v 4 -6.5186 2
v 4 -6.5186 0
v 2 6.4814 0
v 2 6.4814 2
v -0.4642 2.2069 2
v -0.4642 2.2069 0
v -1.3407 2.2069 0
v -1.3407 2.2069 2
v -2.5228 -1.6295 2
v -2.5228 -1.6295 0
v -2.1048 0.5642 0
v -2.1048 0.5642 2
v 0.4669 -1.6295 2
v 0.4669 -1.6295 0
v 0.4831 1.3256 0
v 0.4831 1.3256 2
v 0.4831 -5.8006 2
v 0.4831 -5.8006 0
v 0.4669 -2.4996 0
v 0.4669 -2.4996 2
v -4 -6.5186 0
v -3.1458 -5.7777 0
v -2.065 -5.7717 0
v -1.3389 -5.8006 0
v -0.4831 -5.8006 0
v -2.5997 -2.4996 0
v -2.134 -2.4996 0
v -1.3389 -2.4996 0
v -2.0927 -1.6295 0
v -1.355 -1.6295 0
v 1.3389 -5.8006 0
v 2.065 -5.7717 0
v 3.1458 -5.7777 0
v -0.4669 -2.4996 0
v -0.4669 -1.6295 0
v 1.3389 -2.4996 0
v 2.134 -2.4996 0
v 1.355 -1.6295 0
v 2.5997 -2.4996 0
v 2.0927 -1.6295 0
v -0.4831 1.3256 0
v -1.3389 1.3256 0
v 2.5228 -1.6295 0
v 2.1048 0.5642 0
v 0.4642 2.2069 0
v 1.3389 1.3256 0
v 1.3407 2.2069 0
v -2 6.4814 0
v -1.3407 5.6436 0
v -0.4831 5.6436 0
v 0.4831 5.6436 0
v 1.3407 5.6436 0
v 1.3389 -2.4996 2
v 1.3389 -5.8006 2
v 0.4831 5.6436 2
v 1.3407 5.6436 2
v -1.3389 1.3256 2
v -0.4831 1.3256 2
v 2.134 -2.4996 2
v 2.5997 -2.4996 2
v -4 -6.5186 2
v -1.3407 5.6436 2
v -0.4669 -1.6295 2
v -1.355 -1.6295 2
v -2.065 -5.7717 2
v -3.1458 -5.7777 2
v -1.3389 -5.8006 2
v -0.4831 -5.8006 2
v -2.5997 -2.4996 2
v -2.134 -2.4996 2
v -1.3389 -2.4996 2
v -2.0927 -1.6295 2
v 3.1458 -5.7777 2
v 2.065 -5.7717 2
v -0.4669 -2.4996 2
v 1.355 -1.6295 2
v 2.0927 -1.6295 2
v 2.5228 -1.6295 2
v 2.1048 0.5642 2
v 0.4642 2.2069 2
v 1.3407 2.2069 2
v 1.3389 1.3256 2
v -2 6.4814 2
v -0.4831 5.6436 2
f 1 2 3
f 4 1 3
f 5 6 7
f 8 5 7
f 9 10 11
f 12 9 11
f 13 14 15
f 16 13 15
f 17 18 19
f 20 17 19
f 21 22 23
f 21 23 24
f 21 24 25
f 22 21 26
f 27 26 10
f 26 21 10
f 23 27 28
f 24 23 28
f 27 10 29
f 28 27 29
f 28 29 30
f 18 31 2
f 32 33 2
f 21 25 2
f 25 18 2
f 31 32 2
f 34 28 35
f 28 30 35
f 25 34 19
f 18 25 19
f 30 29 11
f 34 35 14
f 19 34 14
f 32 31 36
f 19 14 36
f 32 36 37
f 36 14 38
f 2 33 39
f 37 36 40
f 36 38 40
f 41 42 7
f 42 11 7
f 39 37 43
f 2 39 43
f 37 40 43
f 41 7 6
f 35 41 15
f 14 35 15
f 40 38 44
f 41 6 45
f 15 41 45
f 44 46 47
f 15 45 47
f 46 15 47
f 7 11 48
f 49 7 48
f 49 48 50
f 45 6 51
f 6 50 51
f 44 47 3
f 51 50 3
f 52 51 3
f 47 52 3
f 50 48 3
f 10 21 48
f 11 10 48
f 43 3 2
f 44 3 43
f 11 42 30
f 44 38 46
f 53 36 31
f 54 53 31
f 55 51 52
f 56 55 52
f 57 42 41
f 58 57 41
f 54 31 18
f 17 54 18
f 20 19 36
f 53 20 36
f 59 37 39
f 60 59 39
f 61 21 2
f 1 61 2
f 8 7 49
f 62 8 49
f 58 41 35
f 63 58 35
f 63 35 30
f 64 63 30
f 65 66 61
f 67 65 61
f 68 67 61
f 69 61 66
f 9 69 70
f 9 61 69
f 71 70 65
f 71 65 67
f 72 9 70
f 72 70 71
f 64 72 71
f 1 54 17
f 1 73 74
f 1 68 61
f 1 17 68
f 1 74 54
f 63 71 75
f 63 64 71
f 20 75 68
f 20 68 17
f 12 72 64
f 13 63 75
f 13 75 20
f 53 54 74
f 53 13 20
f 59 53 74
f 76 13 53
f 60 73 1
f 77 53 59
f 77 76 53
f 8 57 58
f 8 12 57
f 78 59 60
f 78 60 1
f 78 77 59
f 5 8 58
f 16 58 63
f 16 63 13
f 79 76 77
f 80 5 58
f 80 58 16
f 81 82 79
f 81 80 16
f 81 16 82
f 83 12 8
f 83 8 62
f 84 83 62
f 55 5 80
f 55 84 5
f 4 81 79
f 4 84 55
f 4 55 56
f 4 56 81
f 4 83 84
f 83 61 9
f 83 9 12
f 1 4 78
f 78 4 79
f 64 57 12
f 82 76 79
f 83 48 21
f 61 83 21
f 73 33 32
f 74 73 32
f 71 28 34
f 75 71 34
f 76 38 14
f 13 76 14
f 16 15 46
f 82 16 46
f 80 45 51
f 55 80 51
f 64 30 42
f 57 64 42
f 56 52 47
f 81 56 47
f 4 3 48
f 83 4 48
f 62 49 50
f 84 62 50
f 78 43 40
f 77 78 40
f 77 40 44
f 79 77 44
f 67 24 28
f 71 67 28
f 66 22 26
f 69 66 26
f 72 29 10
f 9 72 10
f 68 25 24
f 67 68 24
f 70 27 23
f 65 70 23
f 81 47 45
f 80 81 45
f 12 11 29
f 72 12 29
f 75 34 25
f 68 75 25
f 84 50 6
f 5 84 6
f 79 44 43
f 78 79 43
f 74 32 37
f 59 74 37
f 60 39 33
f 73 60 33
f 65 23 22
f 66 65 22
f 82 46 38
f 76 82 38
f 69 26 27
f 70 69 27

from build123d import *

# Parameters (mm, degrees)
F1_DEPTH = 2


with BuildPart() as f1:
    # F0 (on Top) → F1 (new body)
    with BuildSketch(Plane.XY):
        Polygon((2, 6.481428), (0, 6.481428), (-2, 6.481428), (-4, -6.518572), (0, -6.518572), (4, -6.518572), align=None)
        Polygon((-2.599652, -2.499616), (-2.133971, -2.499616), (-2.064983, -5.771744), (-3.14582, -5.777694), align=None, mode=Mode.SUBTRACT)
        Polygon((-1.338938, -5.800603), (-1.338938, -2.499616), (-0.466865, -2.499616), (-0.483132, -5.800603), align=None, mode=Mode.SUBTRACT)
        Polygon((-2.522781, -1.629516), (-2.104775, 0.564183), (-2.0927, -1.629516), align=None, mode=Mode.SUBTRACT)
        Polygon((-1.354969, -1.629516), (-1.338938, 1.325562), (-0.483132, 1.325562), (-0.466865, -1.629516), align=None, mode=Mode.SUBTRACT)
        Polygon((1.338938, -5.800603), (0.483132, -5.800603), (0.466865, -2.499616), (1.338938, -2.499616), align=None, mode=Mode.SUBTRACT)
        Polygon((2.599652, -2.499616), (3.14582, -5.777694), (2.064983, -5.771744), (2.133971, -2.499616), align=None, mode=Mode.SUBTRACT)
        Polygon((1.354969, -1.629516), (0.466865, -1.629516), (0.483132, 1.325562), (1.338938, 1.325562), align=None, mode=Mode.SUBTRACT)
        Polygon((2.522781, -1.629516), (2.0927, -1.629516), (2.104775, 0.564183), align=None, mode=Mode.SUBTRACT)
        Polygon((-1.34072, 5.643583), (-0.483132, 5.643583), (-0.464214, 2.206922), (-1.34072, 2.206922), align=None, mode=Mode.SUBTRACT)
        Polygon((1.34072, 5.643583), (1.34072, 2.206922), (0.464214, 2.206922), (0.483132, 5.643583), align=None, mode=Mode.SUBTRACT)
    extrude(amount=F1_DEPTH)


solid = f1.part
